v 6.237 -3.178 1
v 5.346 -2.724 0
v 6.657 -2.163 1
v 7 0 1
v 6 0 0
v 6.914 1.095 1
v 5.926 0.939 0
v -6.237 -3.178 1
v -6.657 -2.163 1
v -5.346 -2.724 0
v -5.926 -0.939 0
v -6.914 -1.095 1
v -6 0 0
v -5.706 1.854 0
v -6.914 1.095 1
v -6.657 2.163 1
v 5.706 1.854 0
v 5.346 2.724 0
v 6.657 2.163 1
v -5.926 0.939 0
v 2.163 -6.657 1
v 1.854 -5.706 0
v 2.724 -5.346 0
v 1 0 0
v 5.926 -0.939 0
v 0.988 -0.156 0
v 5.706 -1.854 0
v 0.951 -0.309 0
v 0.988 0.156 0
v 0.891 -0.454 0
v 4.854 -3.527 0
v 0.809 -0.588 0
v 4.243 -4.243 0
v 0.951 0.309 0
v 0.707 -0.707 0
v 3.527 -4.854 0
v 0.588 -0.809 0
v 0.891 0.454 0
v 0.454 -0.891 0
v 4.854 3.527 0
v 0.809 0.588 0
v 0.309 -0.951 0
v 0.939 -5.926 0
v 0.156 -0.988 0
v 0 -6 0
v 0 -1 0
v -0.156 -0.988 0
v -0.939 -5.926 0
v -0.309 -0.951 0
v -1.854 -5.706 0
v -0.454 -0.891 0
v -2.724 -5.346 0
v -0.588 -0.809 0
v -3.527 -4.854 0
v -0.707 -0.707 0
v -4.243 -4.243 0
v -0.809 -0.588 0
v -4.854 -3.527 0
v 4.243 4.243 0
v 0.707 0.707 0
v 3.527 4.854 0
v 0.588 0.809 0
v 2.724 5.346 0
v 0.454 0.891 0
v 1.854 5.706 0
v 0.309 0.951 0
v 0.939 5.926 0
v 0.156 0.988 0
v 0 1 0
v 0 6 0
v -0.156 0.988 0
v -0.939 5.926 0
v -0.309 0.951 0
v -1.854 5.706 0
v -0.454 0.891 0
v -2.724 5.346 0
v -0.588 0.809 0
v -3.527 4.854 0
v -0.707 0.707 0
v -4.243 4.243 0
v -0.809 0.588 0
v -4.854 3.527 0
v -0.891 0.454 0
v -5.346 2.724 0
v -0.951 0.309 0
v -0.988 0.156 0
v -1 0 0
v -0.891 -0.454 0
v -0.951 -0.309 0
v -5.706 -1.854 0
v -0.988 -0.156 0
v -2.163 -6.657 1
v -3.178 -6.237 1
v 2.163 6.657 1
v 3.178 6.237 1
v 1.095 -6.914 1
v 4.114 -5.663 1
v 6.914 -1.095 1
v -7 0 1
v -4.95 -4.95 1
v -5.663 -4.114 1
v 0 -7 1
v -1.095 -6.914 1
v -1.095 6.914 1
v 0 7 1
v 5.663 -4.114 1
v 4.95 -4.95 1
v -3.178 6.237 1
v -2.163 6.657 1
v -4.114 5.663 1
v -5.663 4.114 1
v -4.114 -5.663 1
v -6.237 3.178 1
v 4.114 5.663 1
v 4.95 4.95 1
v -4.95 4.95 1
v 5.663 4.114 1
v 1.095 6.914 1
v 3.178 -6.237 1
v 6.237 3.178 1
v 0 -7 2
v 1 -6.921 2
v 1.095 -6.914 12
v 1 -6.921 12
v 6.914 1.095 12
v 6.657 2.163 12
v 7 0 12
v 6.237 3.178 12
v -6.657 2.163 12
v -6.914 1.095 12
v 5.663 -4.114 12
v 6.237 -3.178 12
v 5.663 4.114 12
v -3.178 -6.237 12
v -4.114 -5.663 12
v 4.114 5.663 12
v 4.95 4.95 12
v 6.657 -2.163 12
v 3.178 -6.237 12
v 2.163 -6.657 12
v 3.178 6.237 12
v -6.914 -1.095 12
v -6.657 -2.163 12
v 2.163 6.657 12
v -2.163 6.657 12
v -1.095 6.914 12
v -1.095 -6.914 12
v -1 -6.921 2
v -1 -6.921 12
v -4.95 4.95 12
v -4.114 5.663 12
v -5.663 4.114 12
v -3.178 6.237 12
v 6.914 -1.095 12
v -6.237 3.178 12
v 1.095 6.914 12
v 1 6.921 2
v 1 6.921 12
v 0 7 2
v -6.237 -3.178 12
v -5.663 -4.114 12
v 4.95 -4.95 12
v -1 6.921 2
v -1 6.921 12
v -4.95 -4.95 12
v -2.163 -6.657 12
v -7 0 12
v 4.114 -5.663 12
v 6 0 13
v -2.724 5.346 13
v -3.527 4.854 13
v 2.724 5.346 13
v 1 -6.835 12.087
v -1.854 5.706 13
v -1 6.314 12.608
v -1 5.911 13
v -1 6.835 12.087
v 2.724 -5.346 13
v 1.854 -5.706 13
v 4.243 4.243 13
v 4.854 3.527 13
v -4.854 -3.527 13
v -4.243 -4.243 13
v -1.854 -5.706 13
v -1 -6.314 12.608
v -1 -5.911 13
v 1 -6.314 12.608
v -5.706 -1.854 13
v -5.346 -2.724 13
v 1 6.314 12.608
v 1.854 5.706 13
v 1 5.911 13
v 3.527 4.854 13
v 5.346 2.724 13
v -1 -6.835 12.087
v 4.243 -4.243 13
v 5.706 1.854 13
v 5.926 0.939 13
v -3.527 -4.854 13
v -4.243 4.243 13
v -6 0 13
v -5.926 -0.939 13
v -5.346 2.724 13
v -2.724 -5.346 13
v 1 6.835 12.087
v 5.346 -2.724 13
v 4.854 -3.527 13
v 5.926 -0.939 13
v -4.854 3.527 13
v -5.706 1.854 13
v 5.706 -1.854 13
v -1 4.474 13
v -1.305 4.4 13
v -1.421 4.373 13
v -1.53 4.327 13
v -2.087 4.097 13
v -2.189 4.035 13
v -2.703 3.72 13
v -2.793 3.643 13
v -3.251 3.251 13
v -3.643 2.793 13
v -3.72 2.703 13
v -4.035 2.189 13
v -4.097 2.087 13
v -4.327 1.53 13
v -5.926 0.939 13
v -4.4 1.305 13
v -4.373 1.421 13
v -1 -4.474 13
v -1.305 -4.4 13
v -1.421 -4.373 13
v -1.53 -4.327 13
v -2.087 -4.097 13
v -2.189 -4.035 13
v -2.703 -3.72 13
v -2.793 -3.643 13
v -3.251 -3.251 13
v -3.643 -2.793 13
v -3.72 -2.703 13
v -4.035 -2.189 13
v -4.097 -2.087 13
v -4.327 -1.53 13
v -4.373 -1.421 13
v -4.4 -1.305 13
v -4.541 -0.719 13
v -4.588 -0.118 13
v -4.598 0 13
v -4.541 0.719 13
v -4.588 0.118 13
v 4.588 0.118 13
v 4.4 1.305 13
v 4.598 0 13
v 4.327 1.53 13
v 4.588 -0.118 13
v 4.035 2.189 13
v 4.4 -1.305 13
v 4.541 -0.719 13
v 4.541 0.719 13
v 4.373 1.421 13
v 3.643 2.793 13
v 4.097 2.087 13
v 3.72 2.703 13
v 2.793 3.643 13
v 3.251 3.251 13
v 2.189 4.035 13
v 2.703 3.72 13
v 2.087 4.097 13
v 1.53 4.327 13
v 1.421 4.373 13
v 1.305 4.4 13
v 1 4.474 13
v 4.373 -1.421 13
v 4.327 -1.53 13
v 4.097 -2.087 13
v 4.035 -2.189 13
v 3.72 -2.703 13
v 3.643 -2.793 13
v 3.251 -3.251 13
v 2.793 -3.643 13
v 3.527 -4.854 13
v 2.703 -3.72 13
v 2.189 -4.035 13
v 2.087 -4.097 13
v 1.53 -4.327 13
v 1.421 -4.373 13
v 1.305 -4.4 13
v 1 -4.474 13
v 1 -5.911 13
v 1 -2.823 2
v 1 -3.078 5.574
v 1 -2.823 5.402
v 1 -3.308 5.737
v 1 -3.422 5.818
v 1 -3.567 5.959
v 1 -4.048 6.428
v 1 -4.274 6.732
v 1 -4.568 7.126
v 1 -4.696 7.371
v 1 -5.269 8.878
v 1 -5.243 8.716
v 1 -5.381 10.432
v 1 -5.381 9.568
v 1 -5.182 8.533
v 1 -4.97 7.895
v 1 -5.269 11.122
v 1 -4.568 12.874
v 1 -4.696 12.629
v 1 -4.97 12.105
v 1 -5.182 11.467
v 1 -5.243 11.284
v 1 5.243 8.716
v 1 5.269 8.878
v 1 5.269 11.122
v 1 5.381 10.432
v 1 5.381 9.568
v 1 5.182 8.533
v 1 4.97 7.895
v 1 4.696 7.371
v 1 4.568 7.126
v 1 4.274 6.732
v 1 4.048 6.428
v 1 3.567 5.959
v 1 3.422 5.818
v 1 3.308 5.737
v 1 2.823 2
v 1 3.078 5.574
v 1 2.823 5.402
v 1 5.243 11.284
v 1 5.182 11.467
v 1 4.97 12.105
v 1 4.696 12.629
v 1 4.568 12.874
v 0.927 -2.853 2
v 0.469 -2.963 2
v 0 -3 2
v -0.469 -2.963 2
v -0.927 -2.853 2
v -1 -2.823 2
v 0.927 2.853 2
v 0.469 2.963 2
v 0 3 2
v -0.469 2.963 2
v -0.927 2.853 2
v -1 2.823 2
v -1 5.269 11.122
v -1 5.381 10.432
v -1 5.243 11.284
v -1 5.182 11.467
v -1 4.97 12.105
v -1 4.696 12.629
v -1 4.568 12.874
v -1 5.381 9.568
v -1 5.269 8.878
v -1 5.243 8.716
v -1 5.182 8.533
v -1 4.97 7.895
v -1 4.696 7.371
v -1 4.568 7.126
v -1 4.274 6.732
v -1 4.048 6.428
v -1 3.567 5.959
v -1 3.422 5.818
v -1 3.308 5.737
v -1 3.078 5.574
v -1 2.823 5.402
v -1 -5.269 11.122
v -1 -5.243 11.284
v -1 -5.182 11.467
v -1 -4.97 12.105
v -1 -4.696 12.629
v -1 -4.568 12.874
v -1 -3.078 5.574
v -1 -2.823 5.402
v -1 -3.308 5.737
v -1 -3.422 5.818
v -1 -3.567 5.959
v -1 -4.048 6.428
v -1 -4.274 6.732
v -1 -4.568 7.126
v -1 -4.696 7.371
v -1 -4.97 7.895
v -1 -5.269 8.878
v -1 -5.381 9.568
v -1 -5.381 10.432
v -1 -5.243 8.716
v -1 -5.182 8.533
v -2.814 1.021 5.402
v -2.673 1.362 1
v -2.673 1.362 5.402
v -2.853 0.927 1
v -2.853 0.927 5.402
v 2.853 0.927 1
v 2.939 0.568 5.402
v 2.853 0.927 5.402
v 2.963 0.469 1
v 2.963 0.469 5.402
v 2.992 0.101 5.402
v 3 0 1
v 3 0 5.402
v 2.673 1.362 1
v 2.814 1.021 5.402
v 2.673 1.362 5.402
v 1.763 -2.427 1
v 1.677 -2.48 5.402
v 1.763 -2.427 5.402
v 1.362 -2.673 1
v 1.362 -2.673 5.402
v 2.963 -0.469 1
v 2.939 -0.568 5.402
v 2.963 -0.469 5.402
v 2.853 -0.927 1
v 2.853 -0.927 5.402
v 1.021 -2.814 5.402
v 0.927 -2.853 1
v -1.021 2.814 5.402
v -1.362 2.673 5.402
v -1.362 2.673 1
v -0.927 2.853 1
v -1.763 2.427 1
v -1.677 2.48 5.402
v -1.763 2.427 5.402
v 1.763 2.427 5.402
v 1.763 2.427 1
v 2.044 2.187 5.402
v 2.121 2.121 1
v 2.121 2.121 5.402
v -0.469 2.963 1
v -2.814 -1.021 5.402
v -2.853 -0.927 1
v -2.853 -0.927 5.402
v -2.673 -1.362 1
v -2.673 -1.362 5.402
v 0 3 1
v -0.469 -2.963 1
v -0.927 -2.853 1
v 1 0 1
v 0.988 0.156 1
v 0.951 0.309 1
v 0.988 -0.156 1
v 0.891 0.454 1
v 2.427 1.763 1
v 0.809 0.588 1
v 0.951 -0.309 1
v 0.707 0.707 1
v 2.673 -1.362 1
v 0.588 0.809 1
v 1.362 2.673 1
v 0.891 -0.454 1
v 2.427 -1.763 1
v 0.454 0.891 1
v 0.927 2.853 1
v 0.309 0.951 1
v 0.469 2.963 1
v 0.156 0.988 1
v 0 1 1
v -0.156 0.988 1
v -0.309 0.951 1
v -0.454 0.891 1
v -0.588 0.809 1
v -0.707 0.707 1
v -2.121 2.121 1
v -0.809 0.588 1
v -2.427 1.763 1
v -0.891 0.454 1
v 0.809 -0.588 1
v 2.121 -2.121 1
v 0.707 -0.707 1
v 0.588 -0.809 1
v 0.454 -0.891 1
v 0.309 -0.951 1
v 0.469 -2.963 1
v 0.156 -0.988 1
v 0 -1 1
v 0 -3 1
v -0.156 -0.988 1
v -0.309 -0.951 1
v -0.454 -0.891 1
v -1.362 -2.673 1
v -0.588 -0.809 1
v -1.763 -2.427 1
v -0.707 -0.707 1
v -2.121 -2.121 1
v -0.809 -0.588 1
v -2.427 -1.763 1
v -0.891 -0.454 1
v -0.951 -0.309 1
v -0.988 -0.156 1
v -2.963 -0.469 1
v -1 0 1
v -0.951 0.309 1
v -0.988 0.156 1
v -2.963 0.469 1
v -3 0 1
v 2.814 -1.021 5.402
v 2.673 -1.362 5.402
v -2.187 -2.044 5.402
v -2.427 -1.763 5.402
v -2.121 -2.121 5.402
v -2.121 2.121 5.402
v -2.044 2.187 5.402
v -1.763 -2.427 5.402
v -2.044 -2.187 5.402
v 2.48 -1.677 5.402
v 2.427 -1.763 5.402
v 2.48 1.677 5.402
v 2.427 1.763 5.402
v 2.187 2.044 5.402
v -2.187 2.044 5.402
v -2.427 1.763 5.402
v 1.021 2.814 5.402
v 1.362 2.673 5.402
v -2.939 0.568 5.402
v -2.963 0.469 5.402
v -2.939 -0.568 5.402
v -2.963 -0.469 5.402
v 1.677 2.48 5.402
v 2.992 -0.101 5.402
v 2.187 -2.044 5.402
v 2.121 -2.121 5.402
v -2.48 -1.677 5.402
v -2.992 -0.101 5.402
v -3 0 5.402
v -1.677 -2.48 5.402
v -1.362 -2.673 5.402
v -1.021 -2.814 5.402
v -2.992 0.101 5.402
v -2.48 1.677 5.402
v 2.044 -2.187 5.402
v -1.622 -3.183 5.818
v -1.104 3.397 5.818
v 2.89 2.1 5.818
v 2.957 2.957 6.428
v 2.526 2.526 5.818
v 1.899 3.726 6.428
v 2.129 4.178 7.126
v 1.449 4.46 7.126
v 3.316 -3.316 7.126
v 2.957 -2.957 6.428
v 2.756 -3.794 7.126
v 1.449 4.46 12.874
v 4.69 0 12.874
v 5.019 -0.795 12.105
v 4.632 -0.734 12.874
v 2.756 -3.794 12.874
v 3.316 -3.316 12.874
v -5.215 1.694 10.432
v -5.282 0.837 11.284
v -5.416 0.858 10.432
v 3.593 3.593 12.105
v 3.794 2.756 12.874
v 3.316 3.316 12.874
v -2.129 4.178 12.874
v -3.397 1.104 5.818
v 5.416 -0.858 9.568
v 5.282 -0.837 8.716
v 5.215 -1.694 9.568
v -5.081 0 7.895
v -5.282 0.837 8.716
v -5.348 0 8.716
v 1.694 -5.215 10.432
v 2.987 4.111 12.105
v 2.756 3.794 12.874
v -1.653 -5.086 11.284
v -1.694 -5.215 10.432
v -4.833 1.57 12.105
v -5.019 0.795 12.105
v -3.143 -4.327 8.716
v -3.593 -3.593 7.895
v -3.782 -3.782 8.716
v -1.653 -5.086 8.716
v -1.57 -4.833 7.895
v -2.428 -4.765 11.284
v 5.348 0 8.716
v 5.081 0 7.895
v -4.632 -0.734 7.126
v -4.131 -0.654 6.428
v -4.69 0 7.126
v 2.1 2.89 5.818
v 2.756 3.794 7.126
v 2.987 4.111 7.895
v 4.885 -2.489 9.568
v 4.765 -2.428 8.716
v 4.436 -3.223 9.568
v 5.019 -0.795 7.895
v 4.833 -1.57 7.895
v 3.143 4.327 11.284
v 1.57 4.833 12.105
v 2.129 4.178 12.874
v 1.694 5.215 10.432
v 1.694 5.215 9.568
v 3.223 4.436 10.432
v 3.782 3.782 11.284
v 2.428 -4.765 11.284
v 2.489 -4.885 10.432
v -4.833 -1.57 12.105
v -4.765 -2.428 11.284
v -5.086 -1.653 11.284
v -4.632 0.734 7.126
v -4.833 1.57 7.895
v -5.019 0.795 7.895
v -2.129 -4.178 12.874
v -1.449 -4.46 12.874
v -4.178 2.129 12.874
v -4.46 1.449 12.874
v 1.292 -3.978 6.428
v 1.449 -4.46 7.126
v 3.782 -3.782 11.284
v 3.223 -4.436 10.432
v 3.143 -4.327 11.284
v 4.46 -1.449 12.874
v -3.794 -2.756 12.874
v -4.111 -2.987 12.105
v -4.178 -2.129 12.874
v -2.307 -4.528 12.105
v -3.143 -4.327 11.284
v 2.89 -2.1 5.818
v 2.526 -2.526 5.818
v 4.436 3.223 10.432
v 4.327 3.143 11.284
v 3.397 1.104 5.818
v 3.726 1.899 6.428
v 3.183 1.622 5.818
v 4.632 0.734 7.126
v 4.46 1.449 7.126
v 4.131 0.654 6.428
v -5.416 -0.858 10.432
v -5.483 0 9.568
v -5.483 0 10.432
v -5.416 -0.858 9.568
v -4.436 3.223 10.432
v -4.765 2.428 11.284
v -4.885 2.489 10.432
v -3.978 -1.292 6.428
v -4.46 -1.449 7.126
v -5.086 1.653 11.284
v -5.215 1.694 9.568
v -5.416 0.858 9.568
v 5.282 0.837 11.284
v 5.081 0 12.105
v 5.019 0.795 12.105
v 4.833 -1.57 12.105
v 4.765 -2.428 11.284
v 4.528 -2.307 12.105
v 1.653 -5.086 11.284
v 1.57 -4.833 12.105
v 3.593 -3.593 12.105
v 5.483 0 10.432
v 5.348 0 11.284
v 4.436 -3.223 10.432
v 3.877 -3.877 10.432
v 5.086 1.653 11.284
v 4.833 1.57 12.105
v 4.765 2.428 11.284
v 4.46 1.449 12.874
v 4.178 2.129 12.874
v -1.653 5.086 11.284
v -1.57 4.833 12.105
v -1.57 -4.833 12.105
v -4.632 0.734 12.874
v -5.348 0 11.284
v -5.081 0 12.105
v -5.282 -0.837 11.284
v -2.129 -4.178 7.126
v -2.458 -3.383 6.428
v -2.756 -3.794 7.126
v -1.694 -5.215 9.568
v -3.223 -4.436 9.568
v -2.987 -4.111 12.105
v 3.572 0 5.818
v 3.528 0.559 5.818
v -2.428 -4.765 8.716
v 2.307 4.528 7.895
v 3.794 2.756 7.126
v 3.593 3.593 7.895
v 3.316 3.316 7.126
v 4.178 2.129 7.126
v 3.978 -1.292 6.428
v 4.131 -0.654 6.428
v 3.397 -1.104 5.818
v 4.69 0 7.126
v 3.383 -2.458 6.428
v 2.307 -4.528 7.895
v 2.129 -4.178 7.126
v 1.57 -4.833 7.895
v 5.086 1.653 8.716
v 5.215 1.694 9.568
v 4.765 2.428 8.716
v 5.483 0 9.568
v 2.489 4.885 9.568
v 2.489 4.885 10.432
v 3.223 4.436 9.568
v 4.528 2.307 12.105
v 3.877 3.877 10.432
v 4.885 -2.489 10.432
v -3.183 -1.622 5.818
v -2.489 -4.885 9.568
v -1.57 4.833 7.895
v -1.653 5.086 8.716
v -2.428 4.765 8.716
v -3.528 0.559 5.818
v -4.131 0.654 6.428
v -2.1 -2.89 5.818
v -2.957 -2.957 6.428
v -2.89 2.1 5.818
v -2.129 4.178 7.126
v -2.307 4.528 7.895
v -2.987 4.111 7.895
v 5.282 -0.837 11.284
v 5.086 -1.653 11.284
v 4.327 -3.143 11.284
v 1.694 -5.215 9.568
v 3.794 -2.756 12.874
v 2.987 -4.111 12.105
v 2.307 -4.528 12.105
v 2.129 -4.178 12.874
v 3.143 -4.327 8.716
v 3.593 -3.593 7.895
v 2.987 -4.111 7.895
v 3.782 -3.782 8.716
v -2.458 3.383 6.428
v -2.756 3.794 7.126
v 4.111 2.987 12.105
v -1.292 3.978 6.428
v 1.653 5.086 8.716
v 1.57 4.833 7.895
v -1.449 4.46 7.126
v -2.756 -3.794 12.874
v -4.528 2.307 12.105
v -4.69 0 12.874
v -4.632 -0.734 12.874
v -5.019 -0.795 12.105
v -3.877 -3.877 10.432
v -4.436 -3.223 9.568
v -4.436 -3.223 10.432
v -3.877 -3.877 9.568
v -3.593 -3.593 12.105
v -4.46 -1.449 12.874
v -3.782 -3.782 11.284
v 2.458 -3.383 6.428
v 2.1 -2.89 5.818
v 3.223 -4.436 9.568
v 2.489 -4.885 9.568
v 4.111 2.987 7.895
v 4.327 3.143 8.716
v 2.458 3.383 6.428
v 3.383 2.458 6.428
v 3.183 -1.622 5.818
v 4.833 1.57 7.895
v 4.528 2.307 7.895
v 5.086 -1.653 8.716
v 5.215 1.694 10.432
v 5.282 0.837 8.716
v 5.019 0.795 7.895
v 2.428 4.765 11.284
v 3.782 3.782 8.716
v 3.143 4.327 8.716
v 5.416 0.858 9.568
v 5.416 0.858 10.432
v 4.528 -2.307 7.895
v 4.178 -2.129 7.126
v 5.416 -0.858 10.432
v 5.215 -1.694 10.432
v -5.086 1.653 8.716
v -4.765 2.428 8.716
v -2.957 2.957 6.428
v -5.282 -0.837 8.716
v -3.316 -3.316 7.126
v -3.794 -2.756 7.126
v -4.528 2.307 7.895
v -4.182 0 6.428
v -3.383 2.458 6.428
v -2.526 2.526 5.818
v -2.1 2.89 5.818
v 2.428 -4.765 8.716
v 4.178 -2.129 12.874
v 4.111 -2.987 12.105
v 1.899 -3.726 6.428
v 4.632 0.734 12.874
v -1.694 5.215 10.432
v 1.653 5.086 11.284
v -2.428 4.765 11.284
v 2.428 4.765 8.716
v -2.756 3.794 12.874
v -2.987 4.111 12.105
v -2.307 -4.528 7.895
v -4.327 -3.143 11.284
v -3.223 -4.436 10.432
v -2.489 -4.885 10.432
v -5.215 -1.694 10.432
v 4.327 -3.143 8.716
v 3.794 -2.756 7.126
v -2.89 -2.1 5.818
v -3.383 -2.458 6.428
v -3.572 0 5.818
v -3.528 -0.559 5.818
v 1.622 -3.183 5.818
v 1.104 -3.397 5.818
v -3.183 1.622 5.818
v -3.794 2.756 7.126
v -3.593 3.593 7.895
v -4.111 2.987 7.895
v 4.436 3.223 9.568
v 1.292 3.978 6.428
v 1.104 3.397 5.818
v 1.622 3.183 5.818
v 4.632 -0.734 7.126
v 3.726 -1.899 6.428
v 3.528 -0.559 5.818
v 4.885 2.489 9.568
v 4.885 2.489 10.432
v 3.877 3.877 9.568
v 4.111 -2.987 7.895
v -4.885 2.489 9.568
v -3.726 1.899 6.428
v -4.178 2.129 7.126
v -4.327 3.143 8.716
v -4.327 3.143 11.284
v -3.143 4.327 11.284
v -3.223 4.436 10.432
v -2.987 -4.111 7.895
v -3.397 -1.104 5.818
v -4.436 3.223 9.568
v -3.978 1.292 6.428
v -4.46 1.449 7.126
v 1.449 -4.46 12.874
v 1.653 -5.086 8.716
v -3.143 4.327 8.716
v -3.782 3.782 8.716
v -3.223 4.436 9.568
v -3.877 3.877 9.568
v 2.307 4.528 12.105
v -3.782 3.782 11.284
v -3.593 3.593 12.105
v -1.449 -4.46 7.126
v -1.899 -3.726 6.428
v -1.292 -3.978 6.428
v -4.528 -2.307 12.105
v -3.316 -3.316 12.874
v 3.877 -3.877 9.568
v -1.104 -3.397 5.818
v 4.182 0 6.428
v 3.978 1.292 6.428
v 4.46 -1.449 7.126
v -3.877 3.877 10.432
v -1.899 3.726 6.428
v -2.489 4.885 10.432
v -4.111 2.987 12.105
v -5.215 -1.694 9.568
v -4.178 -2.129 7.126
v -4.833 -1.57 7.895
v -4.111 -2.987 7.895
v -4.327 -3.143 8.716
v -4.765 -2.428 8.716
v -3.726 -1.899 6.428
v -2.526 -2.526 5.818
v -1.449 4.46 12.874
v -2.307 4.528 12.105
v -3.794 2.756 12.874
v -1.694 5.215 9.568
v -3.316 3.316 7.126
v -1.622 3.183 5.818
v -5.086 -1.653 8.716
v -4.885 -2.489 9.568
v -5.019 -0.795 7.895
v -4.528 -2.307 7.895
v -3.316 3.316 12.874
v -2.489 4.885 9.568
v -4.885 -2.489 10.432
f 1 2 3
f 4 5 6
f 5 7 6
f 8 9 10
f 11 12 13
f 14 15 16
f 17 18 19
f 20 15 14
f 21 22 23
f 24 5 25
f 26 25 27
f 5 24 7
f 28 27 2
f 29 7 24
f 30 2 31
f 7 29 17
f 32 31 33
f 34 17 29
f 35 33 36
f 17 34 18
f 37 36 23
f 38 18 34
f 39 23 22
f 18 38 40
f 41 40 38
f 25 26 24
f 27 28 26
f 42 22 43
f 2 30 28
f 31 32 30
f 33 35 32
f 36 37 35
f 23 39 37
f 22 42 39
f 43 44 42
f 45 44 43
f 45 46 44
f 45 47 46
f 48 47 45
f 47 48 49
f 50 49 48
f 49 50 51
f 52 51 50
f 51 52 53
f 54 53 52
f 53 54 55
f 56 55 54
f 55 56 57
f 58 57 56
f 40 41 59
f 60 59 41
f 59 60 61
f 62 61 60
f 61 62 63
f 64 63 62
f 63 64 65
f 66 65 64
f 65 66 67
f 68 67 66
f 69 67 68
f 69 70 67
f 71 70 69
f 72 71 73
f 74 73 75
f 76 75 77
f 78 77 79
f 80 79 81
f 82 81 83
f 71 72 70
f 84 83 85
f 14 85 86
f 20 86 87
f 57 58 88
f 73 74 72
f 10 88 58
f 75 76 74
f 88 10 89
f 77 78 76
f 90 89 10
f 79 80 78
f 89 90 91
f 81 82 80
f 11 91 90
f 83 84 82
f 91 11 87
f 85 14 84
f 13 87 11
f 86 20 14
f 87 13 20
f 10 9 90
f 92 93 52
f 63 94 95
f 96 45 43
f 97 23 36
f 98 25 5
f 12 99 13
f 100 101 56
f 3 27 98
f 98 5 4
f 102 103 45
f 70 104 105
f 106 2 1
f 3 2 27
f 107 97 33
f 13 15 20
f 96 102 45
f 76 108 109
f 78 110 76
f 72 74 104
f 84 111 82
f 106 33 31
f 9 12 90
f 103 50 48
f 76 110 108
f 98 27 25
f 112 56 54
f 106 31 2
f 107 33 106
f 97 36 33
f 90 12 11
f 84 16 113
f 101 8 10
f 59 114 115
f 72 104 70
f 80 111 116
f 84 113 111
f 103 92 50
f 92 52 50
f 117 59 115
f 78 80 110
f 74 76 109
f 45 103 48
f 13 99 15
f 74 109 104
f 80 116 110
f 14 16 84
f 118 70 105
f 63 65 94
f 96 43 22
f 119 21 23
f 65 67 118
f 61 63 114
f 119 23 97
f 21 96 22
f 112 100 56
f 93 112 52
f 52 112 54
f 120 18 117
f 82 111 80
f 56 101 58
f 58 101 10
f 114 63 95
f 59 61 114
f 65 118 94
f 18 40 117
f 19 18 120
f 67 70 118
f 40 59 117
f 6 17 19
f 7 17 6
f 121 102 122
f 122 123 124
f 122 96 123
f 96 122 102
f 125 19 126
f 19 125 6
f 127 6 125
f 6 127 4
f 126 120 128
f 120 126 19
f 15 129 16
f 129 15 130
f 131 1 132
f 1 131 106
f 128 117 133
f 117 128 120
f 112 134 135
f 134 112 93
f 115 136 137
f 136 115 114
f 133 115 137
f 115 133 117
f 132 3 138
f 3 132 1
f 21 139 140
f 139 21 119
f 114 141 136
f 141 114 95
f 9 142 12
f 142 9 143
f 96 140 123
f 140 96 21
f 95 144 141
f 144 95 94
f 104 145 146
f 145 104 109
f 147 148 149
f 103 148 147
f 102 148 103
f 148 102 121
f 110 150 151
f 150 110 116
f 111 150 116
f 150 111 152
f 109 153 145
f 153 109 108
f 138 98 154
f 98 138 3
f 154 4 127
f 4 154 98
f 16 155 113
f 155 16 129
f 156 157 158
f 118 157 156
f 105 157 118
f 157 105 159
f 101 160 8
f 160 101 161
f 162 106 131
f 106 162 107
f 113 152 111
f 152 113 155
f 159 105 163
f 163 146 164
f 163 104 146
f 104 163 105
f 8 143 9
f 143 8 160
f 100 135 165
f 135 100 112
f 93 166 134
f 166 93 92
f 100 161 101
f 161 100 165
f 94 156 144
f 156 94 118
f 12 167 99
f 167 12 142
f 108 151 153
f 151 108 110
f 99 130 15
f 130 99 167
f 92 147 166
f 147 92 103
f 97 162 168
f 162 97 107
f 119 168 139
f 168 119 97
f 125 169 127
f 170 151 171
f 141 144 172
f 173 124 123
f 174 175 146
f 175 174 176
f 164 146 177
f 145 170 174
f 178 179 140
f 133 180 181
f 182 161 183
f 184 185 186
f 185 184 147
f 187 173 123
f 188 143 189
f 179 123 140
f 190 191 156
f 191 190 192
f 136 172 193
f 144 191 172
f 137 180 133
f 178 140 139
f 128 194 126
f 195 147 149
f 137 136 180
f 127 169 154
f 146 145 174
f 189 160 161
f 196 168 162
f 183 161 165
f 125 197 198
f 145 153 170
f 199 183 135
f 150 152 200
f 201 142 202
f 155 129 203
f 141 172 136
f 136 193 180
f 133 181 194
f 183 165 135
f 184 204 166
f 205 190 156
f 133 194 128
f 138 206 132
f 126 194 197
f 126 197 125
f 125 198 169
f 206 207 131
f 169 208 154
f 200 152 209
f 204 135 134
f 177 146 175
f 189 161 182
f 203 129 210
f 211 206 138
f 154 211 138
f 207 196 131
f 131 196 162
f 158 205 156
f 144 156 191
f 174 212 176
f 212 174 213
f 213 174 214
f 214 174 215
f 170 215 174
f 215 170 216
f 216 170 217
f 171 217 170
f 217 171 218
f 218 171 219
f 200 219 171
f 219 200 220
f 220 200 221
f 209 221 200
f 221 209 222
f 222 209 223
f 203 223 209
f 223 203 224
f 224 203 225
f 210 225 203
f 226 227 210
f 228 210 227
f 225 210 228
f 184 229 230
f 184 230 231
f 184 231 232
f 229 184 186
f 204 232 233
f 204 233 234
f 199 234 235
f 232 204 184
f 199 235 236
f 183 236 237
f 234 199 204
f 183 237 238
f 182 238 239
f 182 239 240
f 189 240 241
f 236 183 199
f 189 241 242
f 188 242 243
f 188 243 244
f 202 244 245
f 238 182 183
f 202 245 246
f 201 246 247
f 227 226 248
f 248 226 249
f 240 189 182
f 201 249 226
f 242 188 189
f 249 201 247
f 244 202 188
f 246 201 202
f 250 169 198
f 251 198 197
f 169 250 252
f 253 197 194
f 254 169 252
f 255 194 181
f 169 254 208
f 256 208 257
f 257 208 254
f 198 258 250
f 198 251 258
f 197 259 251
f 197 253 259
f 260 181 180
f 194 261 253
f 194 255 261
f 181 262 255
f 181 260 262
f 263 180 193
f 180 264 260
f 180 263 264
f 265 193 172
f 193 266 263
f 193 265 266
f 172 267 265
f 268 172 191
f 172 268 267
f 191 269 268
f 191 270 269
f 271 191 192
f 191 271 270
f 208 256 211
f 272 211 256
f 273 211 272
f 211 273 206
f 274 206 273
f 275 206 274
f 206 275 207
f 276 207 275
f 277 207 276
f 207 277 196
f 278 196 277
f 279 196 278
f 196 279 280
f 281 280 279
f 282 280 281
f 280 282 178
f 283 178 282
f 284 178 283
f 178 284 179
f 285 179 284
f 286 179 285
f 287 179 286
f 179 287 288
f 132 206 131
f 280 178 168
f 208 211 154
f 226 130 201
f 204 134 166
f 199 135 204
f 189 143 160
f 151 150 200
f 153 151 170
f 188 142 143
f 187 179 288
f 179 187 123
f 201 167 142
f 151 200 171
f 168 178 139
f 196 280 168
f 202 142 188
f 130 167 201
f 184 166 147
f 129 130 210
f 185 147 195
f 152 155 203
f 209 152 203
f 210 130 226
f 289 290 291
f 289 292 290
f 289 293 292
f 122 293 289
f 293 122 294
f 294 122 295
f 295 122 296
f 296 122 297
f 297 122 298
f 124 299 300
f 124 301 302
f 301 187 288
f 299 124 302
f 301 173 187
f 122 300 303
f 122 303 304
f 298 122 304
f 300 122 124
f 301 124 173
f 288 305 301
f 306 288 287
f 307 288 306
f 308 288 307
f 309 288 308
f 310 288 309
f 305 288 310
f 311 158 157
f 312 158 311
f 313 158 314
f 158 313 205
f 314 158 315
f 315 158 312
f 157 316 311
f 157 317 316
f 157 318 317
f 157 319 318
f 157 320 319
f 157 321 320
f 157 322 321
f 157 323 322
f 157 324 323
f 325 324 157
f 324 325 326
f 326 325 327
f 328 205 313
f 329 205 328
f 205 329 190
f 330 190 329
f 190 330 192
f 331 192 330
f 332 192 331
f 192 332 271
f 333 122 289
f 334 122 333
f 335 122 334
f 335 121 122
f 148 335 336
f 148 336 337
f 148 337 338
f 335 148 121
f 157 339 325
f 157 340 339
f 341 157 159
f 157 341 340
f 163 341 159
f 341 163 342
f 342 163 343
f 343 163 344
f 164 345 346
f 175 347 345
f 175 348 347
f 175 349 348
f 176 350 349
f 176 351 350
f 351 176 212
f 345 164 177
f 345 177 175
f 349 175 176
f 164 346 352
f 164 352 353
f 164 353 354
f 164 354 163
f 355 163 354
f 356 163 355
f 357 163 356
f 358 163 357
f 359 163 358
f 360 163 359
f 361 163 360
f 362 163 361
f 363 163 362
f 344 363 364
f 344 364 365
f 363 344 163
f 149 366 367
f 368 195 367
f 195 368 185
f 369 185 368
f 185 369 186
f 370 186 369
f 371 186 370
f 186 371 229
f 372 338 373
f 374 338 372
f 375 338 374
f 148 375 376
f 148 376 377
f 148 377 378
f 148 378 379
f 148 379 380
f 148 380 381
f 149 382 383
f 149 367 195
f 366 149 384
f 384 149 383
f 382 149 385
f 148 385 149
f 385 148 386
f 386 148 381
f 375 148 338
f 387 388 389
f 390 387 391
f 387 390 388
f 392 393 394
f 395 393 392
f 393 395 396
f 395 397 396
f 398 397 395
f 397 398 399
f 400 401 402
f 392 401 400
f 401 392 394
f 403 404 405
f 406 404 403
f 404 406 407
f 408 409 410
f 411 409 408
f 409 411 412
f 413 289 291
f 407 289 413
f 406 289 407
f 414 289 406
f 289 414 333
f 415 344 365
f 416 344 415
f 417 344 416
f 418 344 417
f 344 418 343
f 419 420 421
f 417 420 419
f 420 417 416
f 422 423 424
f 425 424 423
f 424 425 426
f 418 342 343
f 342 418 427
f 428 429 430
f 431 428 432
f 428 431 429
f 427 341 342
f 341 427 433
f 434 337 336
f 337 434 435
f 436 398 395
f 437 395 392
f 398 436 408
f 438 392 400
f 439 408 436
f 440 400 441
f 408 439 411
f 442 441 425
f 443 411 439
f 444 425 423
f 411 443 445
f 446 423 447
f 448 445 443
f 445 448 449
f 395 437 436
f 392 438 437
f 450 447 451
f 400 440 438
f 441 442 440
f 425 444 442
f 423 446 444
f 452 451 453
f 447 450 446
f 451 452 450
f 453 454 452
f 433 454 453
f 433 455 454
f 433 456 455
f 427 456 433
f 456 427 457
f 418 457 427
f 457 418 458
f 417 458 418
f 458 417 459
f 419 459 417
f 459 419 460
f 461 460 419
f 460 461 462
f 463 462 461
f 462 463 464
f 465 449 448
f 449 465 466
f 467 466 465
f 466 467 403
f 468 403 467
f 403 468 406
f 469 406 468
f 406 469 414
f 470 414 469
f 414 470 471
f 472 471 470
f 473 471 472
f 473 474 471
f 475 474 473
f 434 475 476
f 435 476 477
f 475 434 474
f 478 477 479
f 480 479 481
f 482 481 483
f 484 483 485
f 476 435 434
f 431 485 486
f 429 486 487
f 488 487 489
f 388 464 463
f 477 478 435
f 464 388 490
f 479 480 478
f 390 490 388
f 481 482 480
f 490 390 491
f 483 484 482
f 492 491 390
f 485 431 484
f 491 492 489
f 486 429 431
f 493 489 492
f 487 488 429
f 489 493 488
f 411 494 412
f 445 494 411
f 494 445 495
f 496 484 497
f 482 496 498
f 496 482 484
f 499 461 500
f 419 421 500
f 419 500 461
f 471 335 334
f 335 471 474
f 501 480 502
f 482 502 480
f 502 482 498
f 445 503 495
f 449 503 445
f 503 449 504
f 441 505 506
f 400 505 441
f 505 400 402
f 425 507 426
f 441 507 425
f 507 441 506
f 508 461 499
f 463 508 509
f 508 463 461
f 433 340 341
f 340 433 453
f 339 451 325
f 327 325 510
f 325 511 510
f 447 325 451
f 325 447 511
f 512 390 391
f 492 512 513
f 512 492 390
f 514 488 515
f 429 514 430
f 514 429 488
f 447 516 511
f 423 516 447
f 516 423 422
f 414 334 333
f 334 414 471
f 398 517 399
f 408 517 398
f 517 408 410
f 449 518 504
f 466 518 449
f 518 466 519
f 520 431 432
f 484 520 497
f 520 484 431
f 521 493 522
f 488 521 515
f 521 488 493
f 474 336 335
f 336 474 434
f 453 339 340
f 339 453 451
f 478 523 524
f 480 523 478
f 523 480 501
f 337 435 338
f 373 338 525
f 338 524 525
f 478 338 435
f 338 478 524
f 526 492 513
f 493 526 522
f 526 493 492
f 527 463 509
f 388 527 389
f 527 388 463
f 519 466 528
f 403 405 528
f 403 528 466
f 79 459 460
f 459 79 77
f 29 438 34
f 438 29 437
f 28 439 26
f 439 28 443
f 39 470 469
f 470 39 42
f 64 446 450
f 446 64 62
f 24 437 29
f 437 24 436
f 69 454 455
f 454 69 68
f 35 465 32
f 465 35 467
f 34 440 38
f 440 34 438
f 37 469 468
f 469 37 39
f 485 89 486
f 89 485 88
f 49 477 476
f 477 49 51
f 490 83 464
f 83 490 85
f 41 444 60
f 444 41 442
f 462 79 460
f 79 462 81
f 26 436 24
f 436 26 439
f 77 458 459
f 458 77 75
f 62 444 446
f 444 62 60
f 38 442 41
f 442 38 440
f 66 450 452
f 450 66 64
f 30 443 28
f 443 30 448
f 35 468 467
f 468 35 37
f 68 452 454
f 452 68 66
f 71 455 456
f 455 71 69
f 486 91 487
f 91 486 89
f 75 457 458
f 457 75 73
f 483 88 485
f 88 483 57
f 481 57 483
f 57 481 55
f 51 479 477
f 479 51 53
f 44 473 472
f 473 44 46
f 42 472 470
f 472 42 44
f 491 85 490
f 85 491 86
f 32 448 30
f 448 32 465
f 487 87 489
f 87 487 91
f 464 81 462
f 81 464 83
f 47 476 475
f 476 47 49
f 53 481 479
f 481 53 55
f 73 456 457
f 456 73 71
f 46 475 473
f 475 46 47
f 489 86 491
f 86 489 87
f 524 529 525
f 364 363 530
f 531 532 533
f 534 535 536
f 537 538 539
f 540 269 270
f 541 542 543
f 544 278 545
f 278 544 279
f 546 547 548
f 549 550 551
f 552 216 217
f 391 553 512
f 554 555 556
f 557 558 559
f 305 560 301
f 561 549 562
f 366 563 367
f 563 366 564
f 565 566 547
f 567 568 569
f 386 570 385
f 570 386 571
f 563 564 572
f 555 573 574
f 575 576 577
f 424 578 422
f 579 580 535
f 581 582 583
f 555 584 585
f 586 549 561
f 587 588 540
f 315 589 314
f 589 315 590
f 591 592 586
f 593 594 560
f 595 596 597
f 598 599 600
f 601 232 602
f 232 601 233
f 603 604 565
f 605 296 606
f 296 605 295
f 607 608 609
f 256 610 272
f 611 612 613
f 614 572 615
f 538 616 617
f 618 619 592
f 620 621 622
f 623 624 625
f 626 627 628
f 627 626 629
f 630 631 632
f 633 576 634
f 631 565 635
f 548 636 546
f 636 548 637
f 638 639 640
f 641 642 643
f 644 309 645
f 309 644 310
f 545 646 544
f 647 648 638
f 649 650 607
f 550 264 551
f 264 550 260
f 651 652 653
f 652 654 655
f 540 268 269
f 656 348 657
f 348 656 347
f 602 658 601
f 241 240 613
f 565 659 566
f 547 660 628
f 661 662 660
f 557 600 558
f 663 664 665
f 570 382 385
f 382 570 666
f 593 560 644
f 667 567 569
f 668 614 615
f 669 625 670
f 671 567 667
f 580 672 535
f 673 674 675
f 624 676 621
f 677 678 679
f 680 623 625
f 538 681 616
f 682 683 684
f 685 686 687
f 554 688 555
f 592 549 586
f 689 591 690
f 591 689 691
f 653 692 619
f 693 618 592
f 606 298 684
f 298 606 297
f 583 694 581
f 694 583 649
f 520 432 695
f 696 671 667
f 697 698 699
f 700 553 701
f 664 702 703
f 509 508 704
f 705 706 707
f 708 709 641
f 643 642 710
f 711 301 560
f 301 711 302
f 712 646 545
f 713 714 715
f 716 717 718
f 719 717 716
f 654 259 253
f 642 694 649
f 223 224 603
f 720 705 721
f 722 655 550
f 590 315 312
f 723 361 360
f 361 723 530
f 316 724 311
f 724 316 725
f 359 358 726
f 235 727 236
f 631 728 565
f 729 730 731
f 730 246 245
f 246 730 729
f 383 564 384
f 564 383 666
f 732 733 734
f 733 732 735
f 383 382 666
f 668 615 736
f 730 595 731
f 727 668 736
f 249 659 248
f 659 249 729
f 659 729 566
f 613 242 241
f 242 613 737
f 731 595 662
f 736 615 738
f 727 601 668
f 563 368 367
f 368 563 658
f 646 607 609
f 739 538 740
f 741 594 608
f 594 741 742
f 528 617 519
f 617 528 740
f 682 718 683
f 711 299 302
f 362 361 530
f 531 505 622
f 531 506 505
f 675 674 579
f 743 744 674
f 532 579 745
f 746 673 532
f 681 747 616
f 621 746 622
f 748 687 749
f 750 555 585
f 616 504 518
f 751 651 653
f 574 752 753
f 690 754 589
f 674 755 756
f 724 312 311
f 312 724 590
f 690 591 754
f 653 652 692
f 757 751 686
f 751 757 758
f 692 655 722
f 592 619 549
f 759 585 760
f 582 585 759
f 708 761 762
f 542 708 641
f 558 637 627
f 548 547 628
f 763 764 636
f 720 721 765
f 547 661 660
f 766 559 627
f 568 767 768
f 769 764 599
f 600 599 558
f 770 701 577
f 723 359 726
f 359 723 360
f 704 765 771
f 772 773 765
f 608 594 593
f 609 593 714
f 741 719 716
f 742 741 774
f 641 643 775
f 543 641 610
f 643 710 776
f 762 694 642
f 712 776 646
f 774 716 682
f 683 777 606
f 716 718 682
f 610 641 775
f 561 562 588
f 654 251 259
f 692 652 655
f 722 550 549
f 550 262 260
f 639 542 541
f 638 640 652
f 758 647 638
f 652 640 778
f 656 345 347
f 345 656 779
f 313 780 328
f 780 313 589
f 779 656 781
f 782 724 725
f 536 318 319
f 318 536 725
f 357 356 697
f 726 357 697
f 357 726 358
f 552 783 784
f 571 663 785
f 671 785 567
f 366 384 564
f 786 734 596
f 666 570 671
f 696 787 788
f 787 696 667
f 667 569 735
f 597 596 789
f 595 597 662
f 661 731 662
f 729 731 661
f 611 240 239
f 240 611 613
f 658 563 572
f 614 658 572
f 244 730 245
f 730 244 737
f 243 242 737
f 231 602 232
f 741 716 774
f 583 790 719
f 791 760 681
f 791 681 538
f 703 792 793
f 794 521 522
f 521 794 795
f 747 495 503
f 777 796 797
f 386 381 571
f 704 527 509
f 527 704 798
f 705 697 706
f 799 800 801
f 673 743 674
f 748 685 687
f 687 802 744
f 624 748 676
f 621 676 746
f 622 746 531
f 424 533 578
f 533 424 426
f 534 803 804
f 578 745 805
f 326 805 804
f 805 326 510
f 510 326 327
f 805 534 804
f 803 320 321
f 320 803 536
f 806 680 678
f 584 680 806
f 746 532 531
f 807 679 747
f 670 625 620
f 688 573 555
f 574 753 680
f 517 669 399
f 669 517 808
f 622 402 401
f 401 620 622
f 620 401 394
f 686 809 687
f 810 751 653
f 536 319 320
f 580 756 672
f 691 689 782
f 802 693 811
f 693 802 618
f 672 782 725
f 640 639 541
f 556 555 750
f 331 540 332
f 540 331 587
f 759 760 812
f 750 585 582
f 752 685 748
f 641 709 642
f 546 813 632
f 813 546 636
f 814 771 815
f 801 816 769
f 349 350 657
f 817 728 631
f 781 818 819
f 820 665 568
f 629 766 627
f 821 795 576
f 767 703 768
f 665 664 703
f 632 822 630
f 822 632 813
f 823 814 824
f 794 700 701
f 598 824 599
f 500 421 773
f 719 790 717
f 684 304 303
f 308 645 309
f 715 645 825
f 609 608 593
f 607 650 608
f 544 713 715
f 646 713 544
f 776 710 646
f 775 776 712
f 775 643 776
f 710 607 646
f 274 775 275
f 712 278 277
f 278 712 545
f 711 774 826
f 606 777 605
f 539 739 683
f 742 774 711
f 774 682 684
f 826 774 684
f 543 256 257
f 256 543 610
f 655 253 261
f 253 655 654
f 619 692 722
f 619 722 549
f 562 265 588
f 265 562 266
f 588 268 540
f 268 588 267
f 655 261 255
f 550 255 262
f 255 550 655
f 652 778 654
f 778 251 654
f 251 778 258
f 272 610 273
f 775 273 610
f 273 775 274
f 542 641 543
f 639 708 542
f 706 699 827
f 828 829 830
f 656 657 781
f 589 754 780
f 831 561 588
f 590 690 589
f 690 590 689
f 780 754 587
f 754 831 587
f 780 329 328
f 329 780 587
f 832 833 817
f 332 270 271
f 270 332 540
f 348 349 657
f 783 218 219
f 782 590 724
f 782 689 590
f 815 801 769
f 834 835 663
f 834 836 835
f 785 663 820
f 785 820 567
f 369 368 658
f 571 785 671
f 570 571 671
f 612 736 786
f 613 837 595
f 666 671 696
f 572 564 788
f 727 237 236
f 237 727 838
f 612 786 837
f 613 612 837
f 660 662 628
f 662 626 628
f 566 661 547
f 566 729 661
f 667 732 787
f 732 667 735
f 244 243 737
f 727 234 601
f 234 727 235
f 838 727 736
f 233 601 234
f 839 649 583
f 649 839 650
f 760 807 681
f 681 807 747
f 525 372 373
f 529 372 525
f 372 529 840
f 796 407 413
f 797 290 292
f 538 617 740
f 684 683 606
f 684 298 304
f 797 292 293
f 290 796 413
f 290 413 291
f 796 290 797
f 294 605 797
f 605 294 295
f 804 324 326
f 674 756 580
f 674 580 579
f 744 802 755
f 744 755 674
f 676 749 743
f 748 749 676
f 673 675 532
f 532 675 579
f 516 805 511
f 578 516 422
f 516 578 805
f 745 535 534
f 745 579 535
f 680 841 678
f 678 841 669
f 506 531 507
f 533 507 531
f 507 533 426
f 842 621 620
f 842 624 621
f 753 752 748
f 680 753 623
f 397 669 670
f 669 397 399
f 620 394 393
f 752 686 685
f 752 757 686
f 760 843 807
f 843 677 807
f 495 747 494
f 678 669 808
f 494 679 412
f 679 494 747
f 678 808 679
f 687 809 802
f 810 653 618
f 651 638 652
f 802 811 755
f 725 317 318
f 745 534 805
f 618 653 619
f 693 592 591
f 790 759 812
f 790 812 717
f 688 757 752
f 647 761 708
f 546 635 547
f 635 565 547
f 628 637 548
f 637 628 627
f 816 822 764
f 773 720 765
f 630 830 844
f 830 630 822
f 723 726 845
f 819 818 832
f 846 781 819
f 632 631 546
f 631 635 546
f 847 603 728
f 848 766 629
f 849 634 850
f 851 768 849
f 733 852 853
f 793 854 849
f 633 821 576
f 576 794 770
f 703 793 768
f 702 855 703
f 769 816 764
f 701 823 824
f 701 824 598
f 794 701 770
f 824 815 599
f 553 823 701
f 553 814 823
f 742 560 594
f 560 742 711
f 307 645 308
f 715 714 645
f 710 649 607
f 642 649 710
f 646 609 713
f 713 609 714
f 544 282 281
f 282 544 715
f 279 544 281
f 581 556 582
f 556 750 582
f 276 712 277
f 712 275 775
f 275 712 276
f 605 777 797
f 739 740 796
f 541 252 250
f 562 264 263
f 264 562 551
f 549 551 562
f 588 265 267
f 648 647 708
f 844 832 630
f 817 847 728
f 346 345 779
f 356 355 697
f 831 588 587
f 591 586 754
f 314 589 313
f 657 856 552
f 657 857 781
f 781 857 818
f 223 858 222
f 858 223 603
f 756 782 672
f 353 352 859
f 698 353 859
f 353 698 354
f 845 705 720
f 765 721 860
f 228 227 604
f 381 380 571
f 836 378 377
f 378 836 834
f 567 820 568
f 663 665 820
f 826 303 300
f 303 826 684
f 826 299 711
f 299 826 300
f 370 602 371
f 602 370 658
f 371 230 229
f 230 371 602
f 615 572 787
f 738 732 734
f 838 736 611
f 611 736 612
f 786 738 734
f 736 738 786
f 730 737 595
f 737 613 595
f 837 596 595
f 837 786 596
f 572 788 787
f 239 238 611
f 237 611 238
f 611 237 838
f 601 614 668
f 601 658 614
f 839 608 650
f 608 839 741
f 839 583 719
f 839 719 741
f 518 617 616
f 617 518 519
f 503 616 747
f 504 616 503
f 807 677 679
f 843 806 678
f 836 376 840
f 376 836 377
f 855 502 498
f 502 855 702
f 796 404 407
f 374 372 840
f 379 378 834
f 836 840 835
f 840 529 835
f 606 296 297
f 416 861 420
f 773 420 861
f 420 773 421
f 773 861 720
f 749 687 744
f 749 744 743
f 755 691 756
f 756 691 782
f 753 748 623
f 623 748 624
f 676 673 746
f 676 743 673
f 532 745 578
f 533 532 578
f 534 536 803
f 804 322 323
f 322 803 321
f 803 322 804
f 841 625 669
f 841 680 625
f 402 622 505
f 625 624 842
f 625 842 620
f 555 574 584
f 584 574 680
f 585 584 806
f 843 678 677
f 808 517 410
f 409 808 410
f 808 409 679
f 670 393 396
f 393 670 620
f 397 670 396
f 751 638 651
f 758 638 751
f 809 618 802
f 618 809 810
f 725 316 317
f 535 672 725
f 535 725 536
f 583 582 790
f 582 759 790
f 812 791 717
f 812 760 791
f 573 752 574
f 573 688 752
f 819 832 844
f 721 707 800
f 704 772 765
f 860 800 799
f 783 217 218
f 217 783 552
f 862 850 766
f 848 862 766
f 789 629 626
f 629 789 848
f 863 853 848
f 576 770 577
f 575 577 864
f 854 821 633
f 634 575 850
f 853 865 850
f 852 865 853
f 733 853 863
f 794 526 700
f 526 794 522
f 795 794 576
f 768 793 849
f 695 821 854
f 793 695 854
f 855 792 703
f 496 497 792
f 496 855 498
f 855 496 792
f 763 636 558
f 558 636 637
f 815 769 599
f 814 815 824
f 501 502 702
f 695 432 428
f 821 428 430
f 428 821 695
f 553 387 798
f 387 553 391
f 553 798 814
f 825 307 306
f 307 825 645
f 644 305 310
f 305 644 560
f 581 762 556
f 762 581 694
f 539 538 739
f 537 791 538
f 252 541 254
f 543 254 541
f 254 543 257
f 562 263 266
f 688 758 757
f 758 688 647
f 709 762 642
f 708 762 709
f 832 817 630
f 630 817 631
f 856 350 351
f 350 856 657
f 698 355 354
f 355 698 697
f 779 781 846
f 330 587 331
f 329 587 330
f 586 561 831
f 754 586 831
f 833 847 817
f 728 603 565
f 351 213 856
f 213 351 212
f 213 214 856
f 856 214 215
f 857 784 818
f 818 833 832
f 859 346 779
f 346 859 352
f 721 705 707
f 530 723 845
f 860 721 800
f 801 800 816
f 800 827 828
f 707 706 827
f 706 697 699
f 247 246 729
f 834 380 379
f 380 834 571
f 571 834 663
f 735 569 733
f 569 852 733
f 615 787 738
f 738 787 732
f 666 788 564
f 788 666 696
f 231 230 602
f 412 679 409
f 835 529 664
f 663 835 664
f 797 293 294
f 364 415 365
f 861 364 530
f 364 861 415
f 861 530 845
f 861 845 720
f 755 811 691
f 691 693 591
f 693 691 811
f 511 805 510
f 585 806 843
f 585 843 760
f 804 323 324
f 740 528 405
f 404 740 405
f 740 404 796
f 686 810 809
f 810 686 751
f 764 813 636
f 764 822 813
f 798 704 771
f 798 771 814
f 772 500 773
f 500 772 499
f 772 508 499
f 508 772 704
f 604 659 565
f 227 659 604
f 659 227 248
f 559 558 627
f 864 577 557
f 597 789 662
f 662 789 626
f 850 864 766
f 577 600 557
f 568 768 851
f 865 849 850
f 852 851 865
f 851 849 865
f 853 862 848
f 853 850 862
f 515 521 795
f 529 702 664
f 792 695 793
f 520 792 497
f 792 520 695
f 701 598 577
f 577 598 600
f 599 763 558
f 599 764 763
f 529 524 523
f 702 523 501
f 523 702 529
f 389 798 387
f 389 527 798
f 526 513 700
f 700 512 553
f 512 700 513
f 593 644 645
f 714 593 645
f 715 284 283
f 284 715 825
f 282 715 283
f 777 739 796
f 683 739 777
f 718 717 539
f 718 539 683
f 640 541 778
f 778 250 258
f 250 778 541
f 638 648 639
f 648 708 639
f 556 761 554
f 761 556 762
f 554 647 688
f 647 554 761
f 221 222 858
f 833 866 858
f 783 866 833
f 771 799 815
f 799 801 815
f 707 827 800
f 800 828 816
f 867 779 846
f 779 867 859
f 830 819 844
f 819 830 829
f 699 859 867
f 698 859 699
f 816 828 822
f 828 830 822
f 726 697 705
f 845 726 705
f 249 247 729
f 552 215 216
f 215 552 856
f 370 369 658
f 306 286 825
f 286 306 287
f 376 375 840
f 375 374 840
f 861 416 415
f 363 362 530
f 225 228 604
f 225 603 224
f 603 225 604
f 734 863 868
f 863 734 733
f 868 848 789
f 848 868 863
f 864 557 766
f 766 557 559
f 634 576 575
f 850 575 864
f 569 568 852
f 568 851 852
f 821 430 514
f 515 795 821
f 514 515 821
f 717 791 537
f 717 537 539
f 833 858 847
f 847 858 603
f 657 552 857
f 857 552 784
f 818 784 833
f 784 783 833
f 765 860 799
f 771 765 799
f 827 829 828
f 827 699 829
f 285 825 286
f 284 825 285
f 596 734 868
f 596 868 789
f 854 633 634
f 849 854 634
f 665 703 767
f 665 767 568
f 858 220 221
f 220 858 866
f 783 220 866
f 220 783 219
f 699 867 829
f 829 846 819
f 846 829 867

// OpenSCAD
// Soporte de bola loca para Sapoconcho (no paramétrico)

$fn=40;

difference(){

union(){    
    cylinder(r1=6,r2=7,h=1);
    translate([0,0,1])cylinder(r=7,h=11);
    translate([0,0,12])cylinder(r1=7,r2=6,h=1);
}

translate([0,0,8])cube([2,16,12],center=true);
translate([0,0,1])cylinder(r=3,h=5);
translate([0,0,-1])cylinder(r=1,h=5);
translate([0,0,10])sphere(5.5);

}
